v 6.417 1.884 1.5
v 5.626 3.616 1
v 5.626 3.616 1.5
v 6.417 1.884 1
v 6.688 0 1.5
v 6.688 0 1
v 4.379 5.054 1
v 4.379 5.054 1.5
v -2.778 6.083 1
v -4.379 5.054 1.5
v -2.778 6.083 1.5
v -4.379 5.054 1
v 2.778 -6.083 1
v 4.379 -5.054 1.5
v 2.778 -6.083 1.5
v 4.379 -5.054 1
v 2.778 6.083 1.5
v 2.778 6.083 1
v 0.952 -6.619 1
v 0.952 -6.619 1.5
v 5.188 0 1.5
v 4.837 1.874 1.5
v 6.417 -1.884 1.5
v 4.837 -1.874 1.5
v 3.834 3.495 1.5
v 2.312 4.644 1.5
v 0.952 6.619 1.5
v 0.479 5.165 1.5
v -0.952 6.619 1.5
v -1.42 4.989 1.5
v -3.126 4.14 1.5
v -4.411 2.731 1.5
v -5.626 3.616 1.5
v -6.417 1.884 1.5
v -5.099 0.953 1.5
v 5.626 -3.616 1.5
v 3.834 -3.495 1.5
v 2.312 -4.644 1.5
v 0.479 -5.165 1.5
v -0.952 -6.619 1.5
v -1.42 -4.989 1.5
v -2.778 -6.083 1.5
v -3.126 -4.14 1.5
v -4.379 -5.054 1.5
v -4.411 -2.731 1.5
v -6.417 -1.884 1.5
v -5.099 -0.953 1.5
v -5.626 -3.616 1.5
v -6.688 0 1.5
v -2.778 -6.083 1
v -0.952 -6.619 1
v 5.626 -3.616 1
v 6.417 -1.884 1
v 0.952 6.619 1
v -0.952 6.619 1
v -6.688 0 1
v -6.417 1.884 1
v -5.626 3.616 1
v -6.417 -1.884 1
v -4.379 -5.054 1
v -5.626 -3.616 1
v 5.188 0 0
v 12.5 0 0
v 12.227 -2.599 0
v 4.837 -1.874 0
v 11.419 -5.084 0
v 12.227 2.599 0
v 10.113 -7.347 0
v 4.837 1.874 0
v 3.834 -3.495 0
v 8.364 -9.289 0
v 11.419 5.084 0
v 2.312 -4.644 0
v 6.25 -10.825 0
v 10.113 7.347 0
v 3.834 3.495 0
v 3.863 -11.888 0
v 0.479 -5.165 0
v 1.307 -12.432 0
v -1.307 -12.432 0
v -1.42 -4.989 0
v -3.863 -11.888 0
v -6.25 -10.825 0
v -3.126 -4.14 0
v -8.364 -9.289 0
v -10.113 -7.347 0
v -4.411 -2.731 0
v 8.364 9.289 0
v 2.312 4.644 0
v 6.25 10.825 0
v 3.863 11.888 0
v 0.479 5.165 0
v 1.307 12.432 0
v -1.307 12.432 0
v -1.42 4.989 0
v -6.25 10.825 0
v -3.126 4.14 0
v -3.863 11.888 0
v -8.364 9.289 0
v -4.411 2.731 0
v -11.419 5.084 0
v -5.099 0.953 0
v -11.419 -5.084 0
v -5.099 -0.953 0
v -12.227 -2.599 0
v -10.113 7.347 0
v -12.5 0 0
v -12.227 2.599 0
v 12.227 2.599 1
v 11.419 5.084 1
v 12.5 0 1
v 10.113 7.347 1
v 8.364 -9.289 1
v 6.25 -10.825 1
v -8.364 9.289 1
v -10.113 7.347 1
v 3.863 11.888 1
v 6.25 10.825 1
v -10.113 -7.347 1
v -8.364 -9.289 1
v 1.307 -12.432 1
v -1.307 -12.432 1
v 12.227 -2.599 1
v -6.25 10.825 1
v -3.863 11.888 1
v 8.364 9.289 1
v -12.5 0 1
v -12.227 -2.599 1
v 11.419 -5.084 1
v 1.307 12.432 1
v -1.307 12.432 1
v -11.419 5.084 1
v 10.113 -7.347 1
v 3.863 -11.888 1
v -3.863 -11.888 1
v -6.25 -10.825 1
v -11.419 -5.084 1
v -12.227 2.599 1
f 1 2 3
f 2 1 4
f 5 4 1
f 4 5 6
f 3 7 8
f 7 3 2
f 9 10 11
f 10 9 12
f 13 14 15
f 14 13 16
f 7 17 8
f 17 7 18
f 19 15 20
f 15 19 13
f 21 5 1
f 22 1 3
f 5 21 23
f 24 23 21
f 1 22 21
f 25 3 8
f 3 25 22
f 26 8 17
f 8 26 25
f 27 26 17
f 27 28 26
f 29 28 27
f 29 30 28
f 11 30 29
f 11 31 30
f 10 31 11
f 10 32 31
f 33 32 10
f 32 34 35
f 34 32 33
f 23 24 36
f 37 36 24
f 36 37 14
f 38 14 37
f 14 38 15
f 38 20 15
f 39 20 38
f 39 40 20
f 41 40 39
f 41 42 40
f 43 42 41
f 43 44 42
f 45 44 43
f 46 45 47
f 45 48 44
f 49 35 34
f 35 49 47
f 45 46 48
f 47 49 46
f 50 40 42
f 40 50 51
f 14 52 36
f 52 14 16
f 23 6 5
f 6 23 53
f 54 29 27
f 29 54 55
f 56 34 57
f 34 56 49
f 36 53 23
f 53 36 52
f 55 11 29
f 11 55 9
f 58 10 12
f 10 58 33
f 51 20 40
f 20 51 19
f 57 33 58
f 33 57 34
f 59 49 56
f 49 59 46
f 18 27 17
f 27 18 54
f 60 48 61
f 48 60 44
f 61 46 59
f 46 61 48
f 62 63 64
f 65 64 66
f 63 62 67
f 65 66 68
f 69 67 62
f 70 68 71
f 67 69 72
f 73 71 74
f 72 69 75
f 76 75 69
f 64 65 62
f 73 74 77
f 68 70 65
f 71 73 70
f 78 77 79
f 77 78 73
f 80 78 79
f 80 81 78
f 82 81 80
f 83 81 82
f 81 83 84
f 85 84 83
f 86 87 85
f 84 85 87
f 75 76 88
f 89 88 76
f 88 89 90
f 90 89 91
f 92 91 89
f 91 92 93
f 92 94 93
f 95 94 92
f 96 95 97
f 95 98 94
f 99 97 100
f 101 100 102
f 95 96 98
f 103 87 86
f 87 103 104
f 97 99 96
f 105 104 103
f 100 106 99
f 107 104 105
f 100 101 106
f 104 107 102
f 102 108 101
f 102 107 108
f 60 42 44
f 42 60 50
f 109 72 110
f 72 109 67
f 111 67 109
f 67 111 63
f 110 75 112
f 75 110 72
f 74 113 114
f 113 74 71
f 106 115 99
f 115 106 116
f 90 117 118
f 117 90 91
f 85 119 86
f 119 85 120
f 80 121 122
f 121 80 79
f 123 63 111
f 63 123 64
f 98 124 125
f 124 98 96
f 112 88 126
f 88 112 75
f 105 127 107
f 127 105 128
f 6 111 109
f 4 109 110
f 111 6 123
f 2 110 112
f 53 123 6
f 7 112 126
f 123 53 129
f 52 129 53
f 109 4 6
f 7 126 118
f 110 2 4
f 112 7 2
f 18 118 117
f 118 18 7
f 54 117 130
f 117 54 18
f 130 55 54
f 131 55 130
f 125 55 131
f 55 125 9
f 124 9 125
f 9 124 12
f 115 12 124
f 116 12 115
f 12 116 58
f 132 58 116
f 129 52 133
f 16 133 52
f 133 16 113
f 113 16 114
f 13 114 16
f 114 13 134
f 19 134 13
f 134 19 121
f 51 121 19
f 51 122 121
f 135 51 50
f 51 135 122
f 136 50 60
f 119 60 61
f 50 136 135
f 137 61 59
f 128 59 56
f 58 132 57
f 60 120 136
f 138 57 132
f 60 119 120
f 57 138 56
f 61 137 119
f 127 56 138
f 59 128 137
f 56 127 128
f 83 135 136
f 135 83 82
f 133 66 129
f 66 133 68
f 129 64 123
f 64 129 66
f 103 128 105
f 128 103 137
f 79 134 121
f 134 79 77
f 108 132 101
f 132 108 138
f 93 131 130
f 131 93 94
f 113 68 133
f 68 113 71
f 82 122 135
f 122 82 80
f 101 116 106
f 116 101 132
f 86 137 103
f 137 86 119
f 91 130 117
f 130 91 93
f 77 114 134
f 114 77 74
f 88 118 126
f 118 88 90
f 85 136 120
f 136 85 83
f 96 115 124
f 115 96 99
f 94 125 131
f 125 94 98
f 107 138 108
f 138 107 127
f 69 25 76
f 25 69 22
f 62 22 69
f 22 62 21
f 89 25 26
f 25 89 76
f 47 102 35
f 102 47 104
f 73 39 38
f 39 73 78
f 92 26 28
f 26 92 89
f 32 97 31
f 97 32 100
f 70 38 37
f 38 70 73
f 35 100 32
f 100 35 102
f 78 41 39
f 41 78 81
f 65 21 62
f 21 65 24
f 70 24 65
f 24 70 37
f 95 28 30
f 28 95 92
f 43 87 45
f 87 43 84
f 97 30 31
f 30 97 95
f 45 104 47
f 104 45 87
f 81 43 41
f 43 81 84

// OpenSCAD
// [FL_INDEX: keywords="openscad, 3d_parametric, Customizable_Bearing_Guard, csg_solid" | COT="Parametric OpenSCAD design from 3DCodeverse"]
// Title: Customizable Bearing Guard

// Bearing guard printer

// Radius of inside of bearing
ir=4.6875;
// Race depth
race=2;
rr=ir+race;
// Guard radius (could be bearing size, or more if you like.
or=12.5;
// Thickness of guard
h=1;
// Thickness of race
raceH = 0.5;
h2=h+raceH;

difference() {
	union() {
		cylinder(r=rr, h=h2);
		cylinder(r=or, h=h);
		}
	cylinder(r=ir+.5, h=h2);
	}
